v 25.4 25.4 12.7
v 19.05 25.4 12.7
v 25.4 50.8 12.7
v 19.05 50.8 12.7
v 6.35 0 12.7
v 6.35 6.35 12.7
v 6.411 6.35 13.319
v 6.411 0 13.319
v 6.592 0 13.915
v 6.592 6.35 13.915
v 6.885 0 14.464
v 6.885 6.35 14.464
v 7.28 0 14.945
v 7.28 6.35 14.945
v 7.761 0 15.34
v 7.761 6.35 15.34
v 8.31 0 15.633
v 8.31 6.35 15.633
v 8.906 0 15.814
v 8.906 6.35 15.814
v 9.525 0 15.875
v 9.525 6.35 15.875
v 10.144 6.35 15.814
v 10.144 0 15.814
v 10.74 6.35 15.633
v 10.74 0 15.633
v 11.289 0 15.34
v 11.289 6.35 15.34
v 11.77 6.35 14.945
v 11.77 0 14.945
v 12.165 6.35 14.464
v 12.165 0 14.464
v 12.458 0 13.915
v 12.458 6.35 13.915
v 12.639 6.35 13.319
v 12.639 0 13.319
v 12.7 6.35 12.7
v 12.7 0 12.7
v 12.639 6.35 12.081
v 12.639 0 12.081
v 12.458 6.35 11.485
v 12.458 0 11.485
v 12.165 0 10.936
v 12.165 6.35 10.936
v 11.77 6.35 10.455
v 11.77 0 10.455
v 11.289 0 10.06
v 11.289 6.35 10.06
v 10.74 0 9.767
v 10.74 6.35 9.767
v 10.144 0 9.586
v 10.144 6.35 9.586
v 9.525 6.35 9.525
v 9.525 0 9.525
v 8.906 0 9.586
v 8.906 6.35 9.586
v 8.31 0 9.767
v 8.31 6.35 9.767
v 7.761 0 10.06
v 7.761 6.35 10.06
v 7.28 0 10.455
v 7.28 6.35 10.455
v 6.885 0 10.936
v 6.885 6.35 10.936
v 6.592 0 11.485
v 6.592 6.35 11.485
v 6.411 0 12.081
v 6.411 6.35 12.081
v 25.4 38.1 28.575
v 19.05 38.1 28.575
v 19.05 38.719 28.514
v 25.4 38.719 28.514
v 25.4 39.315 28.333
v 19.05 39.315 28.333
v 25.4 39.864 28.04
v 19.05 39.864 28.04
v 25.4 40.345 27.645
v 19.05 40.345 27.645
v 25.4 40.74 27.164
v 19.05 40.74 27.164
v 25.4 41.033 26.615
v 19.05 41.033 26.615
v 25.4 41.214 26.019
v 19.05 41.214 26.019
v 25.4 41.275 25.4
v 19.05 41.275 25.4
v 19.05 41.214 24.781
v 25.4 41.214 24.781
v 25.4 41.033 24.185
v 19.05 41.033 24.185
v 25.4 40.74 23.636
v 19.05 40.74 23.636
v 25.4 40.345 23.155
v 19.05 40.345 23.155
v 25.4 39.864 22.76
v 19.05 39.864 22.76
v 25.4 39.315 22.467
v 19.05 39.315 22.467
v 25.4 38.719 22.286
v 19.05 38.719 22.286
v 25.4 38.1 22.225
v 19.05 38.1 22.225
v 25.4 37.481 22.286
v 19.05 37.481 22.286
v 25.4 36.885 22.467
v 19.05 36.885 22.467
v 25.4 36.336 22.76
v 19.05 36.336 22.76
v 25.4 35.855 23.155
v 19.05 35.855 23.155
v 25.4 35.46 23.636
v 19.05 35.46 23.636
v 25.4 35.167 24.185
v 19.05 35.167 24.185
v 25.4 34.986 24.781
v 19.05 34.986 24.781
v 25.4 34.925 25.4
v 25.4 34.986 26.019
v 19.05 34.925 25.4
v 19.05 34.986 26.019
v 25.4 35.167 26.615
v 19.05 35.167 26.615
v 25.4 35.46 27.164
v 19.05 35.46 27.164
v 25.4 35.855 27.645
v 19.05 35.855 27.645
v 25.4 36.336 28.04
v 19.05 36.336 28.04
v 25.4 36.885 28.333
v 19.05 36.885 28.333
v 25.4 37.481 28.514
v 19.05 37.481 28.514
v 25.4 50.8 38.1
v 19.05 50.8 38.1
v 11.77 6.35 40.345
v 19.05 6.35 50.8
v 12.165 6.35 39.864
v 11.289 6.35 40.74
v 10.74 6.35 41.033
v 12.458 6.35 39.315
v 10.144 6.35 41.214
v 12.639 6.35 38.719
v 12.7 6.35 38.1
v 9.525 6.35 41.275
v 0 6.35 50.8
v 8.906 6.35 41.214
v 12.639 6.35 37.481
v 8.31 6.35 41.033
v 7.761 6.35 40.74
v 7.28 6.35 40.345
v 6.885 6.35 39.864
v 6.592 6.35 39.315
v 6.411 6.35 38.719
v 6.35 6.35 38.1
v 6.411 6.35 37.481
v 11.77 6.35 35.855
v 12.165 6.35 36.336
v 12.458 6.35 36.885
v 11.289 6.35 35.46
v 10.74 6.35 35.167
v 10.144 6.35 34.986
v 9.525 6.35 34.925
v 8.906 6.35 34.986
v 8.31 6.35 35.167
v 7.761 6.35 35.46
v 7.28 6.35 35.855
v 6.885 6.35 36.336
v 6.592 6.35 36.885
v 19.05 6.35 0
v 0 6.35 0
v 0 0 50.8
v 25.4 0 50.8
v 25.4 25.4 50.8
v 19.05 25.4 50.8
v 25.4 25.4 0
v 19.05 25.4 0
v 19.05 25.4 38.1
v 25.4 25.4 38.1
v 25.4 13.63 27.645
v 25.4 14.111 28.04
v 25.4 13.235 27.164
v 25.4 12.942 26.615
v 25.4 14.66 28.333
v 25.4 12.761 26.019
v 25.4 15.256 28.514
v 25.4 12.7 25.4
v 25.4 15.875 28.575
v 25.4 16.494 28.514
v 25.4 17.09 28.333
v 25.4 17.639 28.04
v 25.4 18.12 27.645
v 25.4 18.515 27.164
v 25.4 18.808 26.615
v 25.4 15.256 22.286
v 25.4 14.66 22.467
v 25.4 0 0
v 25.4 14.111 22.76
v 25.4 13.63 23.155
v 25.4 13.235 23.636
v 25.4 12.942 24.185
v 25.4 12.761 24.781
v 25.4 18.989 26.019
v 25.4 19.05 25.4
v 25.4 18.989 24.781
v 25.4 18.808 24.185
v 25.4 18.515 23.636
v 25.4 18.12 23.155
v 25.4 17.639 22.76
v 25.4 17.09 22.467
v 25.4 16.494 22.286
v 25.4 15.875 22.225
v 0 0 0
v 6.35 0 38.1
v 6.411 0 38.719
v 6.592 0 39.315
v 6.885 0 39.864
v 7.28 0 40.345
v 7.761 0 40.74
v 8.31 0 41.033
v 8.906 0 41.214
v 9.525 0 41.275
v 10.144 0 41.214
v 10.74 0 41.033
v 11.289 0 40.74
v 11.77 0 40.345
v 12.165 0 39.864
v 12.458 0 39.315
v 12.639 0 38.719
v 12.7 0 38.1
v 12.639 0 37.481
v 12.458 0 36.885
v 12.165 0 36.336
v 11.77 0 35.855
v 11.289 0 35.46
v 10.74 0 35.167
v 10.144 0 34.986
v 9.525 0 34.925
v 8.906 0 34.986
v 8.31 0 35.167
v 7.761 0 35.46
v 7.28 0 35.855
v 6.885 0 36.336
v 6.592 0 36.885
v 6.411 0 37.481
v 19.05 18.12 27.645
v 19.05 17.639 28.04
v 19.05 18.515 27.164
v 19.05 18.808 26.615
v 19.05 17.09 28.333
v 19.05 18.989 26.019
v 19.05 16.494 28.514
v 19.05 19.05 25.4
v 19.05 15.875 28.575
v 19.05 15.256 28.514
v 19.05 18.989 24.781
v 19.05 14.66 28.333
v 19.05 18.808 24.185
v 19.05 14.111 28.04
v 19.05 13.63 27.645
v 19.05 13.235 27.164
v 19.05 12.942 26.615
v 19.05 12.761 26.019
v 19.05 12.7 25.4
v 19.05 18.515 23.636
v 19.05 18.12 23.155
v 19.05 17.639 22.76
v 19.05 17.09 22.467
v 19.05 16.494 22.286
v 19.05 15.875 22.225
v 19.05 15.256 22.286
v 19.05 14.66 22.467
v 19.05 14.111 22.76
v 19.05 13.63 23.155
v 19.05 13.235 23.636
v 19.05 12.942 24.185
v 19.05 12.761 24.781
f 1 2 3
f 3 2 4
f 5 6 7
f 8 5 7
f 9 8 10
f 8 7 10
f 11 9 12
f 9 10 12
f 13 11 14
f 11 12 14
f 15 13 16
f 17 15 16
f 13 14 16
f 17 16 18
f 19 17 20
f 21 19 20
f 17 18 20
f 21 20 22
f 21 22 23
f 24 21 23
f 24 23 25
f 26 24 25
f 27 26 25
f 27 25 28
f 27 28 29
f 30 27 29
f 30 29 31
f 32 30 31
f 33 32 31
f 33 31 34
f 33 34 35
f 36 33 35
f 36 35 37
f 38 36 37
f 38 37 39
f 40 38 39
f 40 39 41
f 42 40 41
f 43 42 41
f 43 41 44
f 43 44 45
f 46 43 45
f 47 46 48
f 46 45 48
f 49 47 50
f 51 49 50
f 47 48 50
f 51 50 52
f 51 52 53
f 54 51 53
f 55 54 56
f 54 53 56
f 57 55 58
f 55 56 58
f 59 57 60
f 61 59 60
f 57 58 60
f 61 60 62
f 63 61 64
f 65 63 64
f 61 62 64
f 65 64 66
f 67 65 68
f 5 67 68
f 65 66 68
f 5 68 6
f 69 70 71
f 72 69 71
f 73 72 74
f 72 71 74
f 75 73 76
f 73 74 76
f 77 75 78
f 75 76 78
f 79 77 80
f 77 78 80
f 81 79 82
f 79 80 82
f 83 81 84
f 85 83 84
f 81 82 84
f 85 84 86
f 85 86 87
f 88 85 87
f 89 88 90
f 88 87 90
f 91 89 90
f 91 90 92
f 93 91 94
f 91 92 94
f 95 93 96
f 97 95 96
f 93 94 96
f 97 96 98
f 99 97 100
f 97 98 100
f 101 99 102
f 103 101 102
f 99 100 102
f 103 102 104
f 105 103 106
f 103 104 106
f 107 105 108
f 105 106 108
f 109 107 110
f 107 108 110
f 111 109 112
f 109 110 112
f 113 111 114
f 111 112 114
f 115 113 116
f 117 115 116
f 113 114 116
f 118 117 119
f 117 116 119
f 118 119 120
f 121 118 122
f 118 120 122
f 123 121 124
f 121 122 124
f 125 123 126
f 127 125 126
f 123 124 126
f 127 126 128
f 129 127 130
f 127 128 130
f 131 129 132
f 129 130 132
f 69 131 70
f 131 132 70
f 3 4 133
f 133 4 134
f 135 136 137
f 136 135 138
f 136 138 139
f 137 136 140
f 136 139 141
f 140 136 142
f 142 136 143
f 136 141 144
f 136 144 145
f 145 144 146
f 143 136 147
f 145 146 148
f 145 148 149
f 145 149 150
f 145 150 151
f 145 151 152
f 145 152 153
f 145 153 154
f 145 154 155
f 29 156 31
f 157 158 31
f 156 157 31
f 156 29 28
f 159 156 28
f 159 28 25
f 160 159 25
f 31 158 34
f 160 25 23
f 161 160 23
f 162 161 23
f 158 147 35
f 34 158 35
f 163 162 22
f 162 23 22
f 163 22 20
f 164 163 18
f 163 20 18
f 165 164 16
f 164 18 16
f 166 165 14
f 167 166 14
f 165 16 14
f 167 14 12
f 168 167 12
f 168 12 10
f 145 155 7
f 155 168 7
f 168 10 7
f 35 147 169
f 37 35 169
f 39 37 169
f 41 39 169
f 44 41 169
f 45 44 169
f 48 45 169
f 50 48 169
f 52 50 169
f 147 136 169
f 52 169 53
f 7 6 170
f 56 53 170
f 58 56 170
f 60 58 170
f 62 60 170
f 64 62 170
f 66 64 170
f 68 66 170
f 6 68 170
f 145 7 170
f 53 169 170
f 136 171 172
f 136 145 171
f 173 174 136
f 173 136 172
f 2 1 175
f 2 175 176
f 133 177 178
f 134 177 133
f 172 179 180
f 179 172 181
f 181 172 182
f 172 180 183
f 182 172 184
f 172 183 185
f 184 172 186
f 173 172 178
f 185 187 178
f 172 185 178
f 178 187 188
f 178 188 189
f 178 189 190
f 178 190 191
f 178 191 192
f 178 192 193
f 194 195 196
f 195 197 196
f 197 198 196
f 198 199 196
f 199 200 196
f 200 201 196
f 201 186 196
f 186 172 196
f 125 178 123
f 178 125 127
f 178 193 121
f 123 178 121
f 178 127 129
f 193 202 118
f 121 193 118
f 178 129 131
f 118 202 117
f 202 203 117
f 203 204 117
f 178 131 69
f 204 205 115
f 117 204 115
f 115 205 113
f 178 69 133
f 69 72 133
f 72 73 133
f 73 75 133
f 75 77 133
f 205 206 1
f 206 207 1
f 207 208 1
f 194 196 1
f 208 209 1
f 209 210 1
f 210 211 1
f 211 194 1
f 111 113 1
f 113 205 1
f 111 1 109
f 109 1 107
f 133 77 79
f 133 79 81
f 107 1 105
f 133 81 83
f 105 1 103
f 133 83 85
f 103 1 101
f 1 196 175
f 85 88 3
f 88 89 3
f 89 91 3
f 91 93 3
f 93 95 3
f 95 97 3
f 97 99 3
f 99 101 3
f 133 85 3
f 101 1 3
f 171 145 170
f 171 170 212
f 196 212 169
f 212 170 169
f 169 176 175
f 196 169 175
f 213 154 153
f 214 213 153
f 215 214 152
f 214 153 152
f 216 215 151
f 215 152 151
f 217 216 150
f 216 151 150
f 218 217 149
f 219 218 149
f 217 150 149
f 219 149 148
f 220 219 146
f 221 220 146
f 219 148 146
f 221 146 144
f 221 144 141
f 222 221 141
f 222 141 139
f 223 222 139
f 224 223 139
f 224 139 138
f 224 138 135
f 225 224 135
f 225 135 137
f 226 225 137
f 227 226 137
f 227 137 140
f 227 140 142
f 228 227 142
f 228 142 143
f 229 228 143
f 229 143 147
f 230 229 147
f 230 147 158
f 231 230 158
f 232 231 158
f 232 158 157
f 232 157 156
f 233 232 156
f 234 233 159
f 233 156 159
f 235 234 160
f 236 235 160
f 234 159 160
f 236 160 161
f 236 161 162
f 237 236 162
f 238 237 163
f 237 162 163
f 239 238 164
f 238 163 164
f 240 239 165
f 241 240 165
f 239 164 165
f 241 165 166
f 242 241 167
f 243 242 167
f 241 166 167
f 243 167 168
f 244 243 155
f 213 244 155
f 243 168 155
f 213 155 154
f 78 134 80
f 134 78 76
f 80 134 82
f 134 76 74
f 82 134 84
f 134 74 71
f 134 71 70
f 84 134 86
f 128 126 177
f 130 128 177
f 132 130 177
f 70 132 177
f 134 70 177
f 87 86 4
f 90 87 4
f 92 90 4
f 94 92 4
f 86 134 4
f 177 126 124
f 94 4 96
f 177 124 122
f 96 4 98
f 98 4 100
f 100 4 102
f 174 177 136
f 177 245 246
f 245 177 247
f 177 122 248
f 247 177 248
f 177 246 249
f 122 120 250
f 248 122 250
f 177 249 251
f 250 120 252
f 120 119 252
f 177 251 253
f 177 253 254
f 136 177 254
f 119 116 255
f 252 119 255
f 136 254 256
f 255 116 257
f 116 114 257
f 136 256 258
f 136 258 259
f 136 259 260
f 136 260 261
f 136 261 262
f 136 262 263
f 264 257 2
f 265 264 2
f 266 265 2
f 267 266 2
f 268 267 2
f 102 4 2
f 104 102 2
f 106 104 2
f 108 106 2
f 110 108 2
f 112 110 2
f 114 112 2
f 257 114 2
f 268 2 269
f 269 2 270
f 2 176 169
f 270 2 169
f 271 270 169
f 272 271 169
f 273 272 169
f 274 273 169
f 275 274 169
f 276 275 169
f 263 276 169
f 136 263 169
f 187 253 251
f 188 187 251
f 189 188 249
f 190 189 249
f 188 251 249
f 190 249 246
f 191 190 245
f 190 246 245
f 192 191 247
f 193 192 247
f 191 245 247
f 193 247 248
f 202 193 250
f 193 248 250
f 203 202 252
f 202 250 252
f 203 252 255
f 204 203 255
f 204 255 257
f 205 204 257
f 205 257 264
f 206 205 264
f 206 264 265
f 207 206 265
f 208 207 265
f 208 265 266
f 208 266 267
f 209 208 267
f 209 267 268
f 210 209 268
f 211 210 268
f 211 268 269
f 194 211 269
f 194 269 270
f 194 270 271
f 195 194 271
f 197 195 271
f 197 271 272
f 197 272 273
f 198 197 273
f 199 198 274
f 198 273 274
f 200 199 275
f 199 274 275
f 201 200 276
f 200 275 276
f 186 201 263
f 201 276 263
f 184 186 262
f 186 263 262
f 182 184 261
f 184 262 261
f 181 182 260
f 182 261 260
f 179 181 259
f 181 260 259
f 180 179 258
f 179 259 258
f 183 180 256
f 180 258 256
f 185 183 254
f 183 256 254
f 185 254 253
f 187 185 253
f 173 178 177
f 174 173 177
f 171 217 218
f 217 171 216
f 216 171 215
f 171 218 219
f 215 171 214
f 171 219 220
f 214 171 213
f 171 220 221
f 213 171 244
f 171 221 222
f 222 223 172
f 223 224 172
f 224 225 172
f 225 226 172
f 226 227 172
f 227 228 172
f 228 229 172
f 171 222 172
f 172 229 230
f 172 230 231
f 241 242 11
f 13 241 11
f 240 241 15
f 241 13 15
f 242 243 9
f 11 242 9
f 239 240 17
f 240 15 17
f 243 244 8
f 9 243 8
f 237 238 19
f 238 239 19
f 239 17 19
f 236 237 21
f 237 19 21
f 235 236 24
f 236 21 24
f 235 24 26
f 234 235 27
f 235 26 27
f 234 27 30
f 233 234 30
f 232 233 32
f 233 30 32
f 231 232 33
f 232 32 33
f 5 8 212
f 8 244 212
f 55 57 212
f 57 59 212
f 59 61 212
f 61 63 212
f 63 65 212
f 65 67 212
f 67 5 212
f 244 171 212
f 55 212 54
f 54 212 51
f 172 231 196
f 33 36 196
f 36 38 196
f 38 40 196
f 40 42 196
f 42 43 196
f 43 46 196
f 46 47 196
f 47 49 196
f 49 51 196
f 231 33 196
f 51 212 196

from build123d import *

# Parameters (mm, degrees)
BOSS_EXTRUDE1_DEPTH = 50.8
CUT_EXTRUDE1_REACH  = 61.906
SKETCH2_R           = 3.175
CUT_EXTRUDE2_REACH  = 61.906
SKETCH3_R           = 3.175
SKETCH4_W           = 25.4
SKETCH4_H           = 25.4
SKETCH4_R           = 3.175
BOSS_EXTRUDE2_DEPTH = 6.35


with BuildPart() as part:
    # Sketch1 → Boss-Extrude1 (new body)
    with BuildSketch(Plane.XY):
        Polygon((0, 0), (25.4, 0), (25.4, 16.852186277), (25.4, 25.4), (19.05, 25.4), (19.05, 6.35), (0, 6.35), align=None)
    extrude(amount=BOSS_EXTRUDE1_DEPTH)

    # Sketch2 → Cut-Extrude1 (cut, up to next)
    with BuildSketch(Plane(origin=(0, 6.35, 0), x_dir=(1, 0, 0), z_dir=(0, 1, 0)), mode=Mode.PRIVATE) as cut_extrude1_sk1:
        with Locations(Location((9.525, -12.7, 0), (0, 0, 180))):
            Circle(SKETCH2_R)
    cut_extrude1_tool1 = extrude(cut_extrude1_sk1.sketch, amount=-CUT_EXTRUDE1_REACH, mode=Mode.PRIVATE) & part.part
    # Sketch2 → Cut-Extrude1 (cut, up to next)
    with BuildSketch(Plane(origin=(0, 6.35, 0), x_dir=(1, 0, 0), z_dir=(0, 1, 0)), mode=Mode.PRIVATE) as cut_extrude1_sk2:
        with Locations(Location((9.525, -38.1, 0), (0, 0, 180))):
            Circle(SKETCH2_R)
    cut_extrude1_tool2 = extrude(cut_extrude1_sk2.sketch, amount=-CUT_EXTRUDE1_REACH, mode=Mode.PRIVATE) & part.part
    add(cut_extrude1_tool1.solids().sort_by_distance((9.525, 6.35, 12.7))[0], mode=Mode.SUBTRACT)
    add(cut_extrude1_tool2.solids().sort_by_distance((9.525, 6.35, 38.1))[0], mode=Mode.SUBTRACT)

    # Sketch3 → Cut-Extrude2 (cut, up to next)
    with BuildSketch(Plane.ZY.offset(-19.05), mode=Mode.PRIVATE) as cut_extrude2_sk1:
        with Locations((25.4, 15.875)):
            Circle(SKETCH3_R)
    cut_extrude2_tool1 = extrude(cut_extrude2_sk1.sketch, amount=-CUT_EXTRUDE2_REACH, mode=Mode.PRIVATE) & part.part
    add(cut_extrude2_tool1.solids().sort_by_distance((19.05, 15.875, 25.4))[0], mode=Mode.SUBTRACT)

    # Sketch4 → Boss-Extrude2 (add)
    with BuildSketch(Plane.ZY.offset(-19.05)):
        with Locations((25.4, 38.1)):
            Rectangle(SKETCH4_W, SKETCH4_H)
        with Locations((25.4, 38.1)):
            Circle(SKETCH4_R, mode=Mode.SUBTRACT)
    extrude(amount=-BOSS_EXTRUDE2_DEPTH)


solid = part.part
